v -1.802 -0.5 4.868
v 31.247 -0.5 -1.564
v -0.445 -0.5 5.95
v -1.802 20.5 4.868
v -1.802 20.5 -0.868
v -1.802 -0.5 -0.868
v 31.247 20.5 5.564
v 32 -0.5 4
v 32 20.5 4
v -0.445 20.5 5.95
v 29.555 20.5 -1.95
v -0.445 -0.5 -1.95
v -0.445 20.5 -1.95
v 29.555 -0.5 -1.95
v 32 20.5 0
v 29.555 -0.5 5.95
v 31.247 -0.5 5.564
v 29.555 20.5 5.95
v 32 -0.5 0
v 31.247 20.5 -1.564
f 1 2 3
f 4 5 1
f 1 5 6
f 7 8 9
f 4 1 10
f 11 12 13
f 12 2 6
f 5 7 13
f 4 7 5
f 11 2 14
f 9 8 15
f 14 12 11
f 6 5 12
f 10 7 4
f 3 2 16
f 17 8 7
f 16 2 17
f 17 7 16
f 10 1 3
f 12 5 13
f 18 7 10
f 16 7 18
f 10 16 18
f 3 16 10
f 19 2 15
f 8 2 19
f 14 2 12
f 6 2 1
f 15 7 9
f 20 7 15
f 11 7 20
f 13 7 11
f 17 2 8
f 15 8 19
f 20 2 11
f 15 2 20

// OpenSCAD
// case 08: the cylinder lies along Y; the cube is a prism along Y too — the shared direction
// need not be Z.
minkowski() { cube([30, 20, 4]); rotate([90, 0, 0]) cylinder(r = 2, h = 1, center = true); }
